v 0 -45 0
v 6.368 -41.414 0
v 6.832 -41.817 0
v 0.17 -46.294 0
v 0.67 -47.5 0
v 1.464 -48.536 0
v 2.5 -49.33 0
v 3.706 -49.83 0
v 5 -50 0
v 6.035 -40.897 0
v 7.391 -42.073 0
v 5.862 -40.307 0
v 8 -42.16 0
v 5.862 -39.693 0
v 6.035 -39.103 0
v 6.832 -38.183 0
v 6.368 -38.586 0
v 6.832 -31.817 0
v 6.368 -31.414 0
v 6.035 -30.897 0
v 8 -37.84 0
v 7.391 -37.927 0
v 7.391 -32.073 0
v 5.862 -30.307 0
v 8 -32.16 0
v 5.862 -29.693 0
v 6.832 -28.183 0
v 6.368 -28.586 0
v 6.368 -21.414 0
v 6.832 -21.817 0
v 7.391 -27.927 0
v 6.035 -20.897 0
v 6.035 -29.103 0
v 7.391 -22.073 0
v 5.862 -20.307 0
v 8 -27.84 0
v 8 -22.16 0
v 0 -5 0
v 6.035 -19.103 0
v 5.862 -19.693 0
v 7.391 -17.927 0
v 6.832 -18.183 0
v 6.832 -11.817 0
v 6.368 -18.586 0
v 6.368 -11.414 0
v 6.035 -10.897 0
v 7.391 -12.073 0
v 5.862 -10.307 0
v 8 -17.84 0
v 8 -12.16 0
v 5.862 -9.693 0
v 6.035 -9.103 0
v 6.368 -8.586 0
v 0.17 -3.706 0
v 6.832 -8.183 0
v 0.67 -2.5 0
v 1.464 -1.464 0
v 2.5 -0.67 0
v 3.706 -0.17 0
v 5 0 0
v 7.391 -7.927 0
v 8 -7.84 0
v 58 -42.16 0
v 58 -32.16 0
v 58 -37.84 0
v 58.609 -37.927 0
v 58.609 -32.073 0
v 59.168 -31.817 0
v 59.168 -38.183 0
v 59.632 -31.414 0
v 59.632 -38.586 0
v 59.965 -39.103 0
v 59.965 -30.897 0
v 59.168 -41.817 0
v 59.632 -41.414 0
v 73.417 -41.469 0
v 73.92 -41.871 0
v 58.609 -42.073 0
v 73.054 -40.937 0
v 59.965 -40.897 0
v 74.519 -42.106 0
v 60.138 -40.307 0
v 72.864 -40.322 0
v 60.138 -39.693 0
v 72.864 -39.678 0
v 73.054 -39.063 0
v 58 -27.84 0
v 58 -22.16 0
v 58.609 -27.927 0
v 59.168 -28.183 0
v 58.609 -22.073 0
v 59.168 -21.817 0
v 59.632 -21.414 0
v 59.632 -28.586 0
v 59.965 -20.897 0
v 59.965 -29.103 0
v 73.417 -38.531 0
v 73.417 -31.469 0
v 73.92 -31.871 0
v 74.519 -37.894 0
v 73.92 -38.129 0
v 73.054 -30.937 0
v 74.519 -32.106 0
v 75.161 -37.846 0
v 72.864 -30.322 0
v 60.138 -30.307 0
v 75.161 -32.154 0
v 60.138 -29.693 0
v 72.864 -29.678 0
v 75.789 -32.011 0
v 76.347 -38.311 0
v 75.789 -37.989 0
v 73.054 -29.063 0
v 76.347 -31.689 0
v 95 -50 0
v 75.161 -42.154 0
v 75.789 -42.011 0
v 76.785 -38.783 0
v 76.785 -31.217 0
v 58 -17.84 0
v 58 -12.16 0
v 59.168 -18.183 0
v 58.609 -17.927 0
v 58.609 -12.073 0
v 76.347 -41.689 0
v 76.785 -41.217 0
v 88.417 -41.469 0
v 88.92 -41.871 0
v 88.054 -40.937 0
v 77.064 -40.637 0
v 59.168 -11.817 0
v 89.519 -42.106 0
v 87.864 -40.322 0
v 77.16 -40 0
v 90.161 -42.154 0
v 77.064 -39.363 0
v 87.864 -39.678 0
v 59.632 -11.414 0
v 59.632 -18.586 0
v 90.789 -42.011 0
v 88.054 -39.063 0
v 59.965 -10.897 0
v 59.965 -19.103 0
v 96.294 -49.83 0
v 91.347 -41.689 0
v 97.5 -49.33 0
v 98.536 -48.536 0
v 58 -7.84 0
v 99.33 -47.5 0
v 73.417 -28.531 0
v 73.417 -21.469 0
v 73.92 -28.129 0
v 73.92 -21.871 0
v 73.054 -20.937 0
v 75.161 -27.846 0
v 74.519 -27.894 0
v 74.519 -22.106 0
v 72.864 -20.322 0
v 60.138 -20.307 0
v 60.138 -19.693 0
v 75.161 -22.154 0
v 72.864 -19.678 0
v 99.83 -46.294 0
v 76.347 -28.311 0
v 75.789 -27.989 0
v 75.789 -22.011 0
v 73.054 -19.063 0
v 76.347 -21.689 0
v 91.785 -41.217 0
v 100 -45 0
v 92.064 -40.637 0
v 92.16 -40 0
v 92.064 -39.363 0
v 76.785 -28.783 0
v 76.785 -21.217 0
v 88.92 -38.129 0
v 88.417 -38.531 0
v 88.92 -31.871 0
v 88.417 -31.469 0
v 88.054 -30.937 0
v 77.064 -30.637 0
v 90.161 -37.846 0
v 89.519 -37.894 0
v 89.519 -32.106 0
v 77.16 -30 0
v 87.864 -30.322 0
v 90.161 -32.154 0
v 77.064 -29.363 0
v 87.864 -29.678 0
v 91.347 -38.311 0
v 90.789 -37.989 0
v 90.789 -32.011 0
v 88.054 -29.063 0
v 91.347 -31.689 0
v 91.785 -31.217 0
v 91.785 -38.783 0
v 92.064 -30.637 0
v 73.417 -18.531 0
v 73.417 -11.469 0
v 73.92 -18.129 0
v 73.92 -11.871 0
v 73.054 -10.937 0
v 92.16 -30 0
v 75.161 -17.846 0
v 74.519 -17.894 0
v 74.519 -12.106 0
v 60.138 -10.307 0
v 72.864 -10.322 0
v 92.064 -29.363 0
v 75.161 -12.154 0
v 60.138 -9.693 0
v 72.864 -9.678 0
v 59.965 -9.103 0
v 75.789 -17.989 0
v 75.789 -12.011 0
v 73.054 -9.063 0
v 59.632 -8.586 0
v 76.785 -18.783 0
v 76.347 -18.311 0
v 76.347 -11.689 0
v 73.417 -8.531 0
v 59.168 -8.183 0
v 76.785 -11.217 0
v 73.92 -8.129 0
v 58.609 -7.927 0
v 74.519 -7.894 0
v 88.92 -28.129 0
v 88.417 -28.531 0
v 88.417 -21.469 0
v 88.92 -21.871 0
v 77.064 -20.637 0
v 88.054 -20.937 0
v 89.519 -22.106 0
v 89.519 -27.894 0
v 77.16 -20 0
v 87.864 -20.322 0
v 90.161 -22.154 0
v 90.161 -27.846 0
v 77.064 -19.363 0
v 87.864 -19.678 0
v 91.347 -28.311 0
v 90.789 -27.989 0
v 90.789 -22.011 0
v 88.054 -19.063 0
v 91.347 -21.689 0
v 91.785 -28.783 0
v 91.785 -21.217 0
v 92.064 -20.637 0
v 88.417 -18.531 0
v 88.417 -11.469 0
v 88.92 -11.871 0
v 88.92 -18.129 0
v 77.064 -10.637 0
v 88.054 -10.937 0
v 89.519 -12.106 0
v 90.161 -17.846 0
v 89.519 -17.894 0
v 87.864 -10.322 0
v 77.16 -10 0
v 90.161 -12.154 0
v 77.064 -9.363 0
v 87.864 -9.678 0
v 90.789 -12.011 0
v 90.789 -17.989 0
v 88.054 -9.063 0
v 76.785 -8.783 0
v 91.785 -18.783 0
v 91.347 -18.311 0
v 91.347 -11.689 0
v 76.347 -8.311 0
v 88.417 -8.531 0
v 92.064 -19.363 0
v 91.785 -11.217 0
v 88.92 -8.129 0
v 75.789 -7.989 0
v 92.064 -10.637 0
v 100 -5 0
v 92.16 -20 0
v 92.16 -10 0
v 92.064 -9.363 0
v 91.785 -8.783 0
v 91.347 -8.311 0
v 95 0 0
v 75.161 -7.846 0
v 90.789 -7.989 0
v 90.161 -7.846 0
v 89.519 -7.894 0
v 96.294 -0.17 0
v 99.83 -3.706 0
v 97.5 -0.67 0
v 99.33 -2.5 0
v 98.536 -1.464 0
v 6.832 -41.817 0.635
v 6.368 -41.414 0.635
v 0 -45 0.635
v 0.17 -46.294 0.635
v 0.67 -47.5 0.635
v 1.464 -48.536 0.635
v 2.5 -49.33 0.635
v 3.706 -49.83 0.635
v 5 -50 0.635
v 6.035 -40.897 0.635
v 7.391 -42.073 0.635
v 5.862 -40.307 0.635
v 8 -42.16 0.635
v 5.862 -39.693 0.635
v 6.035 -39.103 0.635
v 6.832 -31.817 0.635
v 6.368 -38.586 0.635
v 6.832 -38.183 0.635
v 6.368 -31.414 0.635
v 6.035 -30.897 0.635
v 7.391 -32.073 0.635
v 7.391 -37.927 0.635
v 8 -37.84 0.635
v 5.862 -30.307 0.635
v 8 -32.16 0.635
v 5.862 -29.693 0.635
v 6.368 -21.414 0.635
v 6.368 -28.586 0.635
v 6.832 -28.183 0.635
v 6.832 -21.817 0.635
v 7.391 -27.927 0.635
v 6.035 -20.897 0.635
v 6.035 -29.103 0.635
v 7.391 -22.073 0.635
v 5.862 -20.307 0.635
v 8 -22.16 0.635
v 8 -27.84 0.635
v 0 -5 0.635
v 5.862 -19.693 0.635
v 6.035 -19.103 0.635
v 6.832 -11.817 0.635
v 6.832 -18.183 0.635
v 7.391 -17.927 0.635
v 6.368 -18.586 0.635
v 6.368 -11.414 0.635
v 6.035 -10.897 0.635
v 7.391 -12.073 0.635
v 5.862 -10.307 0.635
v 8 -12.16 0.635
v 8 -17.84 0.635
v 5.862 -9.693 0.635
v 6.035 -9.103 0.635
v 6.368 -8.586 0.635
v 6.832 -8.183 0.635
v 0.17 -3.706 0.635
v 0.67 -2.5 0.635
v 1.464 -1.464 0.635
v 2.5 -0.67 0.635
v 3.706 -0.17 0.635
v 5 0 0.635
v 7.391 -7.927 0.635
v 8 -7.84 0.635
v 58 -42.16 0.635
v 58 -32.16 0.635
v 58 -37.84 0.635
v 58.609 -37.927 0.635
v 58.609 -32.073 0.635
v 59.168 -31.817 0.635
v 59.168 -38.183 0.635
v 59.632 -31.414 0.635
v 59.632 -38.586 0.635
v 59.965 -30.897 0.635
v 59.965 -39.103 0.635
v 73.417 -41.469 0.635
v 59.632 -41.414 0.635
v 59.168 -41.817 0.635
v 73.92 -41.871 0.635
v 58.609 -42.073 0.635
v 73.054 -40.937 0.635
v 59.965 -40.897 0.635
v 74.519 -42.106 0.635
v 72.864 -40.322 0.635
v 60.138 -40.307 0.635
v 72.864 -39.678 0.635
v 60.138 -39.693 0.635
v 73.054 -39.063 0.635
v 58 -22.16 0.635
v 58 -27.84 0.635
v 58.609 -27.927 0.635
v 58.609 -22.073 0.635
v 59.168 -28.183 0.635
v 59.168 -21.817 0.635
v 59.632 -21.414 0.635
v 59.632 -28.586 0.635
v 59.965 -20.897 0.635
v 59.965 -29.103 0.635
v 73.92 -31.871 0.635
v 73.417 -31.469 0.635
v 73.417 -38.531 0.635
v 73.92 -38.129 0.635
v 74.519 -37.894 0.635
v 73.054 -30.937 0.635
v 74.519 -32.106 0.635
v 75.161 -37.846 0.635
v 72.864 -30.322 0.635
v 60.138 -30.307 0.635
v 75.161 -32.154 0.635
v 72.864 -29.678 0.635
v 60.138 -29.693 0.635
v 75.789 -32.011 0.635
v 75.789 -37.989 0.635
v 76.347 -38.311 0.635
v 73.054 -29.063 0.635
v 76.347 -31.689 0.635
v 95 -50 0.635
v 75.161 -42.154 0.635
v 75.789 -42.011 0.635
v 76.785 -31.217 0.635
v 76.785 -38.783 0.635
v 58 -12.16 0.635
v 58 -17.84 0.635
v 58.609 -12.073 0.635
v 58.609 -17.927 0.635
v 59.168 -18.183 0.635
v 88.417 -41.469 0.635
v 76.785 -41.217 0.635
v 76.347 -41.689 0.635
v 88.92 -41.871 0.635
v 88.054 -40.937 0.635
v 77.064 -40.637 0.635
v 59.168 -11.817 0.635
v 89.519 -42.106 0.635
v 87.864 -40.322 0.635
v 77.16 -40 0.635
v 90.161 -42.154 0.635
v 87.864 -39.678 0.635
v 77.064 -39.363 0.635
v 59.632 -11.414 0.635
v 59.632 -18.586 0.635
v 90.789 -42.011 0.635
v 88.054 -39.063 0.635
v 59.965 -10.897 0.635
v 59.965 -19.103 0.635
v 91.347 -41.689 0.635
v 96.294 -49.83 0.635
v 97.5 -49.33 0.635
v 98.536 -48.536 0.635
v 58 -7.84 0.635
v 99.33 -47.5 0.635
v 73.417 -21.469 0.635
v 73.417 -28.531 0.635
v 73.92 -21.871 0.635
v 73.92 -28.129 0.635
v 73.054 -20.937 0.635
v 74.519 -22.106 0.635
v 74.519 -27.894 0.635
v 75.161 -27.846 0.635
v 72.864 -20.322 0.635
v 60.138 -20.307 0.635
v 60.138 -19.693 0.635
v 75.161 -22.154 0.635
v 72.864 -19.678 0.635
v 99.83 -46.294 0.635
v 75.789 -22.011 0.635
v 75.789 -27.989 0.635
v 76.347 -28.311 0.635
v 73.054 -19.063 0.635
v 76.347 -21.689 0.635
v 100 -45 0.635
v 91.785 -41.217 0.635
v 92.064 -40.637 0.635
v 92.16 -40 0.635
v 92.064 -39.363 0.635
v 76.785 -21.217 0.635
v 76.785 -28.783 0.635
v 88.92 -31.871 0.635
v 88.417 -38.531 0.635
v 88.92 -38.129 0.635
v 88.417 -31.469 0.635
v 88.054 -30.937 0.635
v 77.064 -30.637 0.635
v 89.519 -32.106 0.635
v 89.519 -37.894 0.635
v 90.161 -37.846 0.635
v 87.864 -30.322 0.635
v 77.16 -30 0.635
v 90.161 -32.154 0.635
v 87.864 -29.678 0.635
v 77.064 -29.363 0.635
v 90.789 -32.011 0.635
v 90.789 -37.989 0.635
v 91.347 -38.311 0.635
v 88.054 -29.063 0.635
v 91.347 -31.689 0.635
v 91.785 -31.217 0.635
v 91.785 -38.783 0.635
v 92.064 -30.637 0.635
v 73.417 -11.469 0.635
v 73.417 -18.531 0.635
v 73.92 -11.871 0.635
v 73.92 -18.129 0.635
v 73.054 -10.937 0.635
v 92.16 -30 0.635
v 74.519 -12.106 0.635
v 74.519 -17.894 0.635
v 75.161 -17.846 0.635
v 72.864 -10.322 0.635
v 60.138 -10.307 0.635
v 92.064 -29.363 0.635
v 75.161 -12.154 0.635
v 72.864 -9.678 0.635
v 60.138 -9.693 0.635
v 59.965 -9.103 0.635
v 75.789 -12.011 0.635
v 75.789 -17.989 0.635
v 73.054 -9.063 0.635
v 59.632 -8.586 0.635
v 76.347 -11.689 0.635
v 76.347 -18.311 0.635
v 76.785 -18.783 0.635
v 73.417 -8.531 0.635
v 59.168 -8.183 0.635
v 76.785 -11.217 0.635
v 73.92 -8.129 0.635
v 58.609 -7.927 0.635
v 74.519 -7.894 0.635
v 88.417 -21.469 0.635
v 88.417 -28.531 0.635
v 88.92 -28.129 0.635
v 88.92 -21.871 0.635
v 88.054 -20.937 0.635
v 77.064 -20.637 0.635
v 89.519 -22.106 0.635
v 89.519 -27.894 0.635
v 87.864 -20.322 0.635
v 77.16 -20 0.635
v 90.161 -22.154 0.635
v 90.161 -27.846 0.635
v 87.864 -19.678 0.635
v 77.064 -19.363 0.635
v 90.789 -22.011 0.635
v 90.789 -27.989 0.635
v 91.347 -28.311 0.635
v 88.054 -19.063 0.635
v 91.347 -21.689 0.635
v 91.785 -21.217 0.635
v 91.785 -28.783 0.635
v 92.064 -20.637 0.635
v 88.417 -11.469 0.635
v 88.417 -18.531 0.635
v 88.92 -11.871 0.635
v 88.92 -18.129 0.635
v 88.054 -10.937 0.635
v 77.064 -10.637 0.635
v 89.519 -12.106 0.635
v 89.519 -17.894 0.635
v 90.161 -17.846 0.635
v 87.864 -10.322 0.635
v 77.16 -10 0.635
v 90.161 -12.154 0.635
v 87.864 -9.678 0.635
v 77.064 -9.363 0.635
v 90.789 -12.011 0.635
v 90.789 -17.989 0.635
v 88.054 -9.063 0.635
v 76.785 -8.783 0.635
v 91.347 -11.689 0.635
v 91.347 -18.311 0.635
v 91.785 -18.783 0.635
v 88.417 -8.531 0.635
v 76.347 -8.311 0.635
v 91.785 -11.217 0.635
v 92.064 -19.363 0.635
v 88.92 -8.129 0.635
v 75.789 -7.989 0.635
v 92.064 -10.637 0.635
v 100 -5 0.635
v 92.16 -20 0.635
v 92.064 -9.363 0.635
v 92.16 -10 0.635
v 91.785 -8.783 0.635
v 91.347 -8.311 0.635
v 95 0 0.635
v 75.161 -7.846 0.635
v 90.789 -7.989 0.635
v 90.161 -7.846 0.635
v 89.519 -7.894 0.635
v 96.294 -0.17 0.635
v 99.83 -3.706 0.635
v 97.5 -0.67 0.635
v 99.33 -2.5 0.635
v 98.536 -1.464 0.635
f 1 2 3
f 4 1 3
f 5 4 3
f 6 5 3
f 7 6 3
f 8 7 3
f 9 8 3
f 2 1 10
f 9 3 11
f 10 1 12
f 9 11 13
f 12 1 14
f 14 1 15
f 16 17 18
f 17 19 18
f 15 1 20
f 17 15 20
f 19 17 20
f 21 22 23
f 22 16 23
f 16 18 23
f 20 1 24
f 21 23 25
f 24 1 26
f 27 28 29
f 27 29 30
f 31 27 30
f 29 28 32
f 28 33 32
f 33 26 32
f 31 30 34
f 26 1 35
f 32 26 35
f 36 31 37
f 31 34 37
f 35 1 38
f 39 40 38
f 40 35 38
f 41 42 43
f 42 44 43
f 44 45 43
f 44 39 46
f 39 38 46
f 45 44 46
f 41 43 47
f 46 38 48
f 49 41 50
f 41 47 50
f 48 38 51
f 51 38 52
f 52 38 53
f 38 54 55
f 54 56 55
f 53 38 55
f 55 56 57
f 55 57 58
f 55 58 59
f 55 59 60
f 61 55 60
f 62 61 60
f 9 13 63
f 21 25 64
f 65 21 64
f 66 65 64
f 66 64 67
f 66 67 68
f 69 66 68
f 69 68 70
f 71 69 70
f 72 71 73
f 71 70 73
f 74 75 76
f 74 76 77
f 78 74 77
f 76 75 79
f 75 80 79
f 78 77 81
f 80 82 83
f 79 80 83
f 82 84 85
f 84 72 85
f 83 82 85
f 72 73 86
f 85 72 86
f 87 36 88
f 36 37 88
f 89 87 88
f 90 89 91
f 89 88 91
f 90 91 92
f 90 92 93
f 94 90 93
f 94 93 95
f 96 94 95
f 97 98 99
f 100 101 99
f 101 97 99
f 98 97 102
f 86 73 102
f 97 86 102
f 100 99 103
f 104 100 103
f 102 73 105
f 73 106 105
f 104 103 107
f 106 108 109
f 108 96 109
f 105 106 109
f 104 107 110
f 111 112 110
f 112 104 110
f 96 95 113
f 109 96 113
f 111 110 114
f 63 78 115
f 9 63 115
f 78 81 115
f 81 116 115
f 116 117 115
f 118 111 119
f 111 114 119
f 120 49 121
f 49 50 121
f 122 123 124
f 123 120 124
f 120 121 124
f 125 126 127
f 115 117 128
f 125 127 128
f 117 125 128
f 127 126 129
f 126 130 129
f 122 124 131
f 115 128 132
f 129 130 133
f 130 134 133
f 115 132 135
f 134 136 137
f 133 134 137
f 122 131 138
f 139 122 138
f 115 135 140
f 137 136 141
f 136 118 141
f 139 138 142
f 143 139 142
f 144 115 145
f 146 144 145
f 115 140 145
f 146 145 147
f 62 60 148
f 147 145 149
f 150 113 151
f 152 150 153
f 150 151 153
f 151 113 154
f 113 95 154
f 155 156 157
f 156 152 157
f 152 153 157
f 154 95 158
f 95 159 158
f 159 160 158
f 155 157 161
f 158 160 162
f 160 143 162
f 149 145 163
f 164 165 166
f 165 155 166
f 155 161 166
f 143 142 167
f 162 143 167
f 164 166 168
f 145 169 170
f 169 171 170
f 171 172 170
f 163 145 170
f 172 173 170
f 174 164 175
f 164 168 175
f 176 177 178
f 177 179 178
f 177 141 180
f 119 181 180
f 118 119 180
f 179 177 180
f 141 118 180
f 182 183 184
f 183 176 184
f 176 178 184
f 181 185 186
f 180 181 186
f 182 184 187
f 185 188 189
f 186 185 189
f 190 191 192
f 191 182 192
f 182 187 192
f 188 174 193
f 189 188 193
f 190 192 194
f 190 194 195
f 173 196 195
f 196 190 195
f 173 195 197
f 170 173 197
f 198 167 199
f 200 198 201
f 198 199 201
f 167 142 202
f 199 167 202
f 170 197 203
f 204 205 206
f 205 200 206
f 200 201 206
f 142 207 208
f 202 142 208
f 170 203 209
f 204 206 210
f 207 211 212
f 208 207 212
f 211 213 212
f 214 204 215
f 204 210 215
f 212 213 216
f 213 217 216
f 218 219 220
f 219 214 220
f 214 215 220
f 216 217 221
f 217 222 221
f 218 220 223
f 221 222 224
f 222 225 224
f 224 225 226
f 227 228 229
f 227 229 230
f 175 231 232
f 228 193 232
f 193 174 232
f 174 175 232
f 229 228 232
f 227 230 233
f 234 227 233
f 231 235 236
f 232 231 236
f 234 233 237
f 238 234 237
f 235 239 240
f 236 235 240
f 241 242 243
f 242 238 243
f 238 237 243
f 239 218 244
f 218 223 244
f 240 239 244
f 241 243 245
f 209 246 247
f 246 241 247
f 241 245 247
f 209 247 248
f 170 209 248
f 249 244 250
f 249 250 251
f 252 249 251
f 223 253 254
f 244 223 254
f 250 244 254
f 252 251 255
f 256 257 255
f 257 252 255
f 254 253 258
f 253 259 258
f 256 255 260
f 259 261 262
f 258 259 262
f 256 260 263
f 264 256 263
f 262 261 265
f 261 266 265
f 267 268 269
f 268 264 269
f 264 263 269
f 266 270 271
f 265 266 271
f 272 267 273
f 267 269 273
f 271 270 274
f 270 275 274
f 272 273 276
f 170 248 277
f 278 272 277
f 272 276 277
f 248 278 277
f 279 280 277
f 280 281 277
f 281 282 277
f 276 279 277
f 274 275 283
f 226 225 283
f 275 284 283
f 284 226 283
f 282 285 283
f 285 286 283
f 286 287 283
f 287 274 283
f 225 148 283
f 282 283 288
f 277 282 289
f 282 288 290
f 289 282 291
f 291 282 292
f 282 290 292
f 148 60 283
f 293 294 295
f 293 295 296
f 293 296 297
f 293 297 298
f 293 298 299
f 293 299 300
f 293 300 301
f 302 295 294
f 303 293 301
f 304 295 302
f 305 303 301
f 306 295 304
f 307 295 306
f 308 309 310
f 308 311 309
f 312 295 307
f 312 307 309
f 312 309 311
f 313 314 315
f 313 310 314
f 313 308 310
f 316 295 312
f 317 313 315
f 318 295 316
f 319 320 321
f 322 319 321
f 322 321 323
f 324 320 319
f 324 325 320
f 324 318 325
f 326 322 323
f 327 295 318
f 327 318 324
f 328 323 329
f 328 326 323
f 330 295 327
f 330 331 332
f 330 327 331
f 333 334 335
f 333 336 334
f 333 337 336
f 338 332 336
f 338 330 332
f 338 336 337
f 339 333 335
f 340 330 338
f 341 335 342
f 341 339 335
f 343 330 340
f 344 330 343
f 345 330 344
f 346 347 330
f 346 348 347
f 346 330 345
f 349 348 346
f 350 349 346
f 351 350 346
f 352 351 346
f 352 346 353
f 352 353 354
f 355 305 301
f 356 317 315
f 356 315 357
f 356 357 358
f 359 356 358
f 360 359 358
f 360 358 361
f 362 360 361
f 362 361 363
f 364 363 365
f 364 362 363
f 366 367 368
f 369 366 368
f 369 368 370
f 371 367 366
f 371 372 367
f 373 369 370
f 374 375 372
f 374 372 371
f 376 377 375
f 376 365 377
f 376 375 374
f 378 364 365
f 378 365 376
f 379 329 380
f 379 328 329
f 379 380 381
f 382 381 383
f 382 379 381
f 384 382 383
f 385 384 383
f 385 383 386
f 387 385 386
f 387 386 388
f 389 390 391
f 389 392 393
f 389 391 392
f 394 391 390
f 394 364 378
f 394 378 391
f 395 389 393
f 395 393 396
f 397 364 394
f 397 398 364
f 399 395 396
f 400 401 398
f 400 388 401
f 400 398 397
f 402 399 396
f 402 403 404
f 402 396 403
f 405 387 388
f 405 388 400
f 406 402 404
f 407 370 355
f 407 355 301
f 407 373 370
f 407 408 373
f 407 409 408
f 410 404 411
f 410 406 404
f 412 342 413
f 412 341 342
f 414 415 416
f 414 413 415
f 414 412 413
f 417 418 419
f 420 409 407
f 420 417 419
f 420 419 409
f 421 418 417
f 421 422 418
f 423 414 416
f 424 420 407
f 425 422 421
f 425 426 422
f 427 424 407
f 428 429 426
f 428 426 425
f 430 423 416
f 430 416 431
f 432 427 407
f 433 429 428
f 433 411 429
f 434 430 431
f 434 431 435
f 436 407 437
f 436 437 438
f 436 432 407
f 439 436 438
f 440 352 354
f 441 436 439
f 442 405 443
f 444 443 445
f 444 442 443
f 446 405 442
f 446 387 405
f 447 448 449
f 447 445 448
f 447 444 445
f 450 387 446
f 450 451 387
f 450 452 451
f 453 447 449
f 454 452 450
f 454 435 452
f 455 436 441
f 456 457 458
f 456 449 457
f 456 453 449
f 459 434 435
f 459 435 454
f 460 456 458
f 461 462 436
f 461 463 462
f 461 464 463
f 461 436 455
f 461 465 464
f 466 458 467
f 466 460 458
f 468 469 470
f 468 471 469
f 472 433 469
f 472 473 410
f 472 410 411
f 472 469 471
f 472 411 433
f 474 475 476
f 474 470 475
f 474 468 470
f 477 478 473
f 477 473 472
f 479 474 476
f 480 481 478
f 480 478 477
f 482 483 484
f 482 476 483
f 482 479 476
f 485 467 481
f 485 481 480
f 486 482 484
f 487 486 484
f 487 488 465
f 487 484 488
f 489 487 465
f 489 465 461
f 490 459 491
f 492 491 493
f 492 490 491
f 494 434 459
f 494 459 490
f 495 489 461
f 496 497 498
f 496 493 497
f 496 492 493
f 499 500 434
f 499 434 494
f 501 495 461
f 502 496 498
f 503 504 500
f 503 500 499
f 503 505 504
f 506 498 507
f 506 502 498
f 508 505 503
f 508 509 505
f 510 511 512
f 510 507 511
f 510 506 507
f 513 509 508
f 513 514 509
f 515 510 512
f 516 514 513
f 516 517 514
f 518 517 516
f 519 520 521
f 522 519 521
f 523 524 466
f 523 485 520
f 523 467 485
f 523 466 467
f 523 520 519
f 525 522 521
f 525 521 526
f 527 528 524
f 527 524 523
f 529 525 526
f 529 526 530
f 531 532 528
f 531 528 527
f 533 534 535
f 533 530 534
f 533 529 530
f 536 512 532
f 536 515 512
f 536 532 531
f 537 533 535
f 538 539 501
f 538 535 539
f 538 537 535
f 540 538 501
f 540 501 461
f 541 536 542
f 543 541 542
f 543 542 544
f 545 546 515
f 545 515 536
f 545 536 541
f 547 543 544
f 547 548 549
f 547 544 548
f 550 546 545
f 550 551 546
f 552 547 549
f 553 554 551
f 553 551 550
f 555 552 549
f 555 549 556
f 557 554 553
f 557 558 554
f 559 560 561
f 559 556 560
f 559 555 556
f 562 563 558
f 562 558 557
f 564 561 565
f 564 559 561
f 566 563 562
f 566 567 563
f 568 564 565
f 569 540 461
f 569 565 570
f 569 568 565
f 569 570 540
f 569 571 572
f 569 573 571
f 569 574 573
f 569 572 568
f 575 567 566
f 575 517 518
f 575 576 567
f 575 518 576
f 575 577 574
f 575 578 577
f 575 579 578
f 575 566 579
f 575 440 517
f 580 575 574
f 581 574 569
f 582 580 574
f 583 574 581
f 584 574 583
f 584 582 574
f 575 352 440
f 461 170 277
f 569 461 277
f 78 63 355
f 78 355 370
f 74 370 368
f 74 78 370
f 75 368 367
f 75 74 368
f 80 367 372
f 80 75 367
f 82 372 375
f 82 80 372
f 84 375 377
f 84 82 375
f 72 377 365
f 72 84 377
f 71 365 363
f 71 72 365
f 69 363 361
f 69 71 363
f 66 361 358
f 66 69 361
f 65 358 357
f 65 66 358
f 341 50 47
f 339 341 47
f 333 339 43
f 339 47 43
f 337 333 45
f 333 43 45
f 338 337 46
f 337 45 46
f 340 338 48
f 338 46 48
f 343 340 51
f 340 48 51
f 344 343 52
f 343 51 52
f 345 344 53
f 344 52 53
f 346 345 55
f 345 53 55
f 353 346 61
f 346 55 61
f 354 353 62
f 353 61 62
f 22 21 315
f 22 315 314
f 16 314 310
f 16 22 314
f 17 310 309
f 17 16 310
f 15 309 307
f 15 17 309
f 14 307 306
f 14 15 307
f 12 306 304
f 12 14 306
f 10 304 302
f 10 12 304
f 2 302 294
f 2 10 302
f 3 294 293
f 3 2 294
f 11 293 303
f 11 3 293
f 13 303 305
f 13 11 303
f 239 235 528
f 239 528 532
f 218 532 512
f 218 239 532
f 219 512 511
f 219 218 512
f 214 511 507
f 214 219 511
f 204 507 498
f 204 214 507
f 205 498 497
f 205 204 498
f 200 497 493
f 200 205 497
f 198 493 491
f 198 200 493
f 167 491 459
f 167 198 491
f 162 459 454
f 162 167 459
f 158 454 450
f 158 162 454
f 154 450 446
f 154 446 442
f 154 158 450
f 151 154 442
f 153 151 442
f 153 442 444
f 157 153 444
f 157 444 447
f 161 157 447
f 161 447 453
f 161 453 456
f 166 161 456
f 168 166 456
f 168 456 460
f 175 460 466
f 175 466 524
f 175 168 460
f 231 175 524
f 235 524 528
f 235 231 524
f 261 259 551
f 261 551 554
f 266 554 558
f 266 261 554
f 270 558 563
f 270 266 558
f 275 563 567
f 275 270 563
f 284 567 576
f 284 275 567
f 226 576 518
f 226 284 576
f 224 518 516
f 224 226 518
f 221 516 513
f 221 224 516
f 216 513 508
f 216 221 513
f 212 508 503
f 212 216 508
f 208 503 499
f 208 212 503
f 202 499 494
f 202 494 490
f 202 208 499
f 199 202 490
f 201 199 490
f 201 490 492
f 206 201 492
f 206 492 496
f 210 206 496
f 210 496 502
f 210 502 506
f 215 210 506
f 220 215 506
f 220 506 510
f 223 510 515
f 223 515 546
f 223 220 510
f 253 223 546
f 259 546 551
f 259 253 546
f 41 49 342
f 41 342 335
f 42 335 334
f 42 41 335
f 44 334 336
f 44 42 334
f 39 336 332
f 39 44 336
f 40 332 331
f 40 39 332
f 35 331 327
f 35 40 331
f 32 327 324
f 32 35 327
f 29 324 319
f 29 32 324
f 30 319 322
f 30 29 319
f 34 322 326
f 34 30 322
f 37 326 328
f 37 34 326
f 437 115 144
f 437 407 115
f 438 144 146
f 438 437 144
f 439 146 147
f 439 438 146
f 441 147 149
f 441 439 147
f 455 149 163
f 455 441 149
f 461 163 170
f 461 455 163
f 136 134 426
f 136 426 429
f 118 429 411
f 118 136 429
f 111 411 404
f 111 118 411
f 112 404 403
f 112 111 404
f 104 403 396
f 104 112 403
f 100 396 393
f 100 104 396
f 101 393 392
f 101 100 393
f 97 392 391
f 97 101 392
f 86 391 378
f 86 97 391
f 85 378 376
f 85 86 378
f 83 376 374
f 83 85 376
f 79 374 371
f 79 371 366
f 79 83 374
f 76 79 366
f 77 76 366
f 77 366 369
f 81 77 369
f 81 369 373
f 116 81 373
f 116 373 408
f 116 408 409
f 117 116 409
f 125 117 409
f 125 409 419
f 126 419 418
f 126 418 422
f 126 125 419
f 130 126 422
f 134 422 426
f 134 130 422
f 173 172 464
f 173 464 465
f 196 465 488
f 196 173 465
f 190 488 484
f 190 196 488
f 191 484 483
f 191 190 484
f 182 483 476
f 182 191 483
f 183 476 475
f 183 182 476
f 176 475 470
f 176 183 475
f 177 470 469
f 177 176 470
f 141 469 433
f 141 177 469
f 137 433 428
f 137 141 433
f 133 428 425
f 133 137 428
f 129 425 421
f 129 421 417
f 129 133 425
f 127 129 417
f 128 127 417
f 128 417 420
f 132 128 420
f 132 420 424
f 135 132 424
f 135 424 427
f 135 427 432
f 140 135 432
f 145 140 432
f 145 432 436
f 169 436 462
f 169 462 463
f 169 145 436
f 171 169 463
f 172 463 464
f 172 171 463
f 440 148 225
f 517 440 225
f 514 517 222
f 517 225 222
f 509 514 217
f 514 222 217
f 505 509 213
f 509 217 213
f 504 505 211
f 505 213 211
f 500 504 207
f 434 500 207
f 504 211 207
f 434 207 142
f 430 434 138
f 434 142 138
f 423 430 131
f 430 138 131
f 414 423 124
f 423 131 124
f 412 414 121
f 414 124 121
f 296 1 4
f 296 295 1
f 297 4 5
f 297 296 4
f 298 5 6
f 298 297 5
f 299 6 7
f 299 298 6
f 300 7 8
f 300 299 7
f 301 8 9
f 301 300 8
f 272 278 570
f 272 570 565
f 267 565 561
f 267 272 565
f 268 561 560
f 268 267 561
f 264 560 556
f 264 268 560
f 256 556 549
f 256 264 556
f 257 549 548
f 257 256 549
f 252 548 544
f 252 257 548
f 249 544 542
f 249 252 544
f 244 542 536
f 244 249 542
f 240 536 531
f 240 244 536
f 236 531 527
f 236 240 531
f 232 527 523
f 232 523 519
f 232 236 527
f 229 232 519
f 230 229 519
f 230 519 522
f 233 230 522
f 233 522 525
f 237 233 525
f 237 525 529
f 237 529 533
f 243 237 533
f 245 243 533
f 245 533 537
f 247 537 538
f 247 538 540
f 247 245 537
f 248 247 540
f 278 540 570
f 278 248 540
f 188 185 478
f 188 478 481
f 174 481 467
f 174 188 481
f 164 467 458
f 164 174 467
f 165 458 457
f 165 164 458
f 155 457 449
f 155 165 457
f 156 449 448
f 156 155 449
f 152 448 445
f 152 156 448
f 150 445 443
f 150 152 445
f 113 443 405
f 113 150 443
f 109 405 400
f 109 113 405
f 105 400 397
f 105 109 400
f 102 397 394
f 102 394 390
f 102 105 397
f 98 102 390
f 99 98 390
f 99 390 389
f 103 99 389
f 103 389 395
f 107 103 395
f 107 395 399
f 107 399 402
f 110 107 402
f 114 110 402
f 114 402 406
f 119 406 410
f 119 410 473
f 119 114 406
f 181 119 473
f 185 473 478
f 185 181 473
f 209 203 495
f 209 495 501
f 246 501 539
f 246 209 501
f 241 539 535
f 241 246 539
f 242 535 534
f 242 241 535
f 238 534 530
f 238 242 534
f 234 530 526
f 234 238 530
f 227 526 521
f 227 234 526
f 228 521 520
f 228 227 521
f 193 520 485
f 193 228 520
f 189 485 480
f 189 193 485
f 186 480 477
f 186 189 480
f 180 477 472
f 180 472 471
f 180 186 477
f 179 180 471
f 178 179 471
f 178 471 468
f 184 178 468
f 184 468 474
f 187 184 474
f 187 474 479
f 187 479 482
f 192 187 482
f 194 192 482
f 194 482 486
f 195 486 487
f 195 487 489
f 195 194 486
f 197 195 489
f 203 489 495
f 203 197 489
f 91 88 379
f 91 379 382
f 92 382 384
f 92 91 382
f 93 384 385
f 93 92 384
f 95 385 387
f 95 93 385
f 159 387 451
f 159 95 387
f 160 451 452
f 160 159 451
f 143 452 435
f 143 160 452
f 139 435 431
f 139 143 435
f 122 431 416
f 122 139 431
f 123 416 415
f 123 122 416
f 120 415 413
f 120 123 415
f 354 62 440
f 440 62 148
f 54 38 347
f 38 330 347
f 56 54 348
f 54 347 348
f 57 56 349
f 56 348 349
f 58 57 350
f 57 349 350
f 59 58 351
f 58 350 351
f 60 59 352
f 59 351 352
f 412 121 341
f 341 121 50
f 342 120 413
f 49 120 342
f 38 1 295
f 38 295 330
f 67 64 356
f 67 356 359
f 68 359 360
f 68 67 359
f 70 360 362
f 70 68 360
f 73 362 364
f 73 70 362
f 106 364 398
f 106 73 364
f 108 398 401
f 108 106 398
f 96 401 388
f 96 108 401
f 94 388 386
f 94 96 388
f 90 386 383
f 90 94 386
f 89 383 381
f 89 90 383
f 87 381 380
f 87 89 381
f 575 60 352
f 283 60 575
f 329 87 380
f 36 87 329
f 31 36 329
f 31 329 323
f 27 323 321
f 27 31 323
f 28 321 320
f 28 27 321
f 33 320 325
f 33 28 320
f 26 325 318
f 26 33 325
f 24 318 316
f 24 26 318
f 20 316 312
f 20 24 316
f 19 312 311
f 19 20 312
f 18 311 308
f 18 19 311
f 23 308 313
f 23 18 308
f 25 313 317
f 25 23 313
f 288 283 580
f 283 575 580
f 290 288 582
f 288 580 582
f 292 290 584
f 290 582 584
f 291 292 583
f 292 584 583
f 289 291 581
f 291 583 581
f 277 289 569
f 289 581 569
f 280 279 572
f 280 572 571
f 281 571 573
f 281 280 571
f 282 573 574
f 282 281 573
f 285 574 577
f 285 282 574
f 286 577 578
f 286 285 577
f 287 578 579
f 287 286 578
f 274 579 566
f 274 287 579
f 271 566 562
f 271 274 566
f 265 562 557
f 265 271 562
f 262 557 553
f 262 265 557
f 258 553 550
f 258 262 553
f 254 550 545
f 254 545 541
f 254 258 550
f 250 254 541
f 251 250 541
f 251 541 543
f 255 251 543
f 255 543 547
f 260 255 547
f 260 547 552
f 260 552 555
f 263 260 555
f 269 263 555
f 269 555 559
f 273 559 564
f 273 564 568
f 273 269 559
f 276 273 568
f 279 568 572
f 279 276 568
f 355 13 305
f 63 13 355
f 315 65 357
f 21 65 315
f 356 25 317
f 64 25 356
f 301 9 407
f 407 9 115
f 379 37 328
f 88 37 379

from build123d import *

# Parameters (mm, degrees)
SKETCH1_W           = 100
SKETCH1_H           = 50
SKETCH1_R           = 2.16
BOSS_EXTRUDE1_DEPTH = 0.635
FILLET1_R           = 5


with BuildPart() as part:
    # Sketch1 → Boss-Extrude1 (new body)
    with BuildSketch(Plane.XY):
        with Locations((50, -25)):
            Rectangle(SKETCH1_W, SKETCH1_H)
        with Locations((75, -10)):
            Circle(SKETCH1_R, mode=Mode.SUBTRACT)
        with Locations((90, -10)):
            Circle(SKETCH1_R, mode=Mode.SUBTRACT)
        with Locations((75, -20)):
            Circle(SKETCH1_R, mode=Mode.SUBTRACT)
        with Locations((90, -20)):
            Circle(SKETCH1_R, mode=Mode.SUBTRACT)
        with Locations((75, -30)):
            Circle(SKETCH1_R, mode=Mode.SUBTRACT)
        with Locations((90, -30)):
            Circle(SKETCH1_R, mode=Mode.SUBTRACT)
        with Locations((75, -40)):
            Circle(SKETCH1_R, mode=Mode.SUBTRACT)
        with Locations((90, -40)):
            Circle(SKETCH1_R, mode=Mode.SUBTRACT)
        with BuildLine():
            Line((8, -7.84), (58, -7.84))
            ThreePointArc((58, -7.84), (60.16, -10), (58, -12.16))
            Line((58, -12.16), (8, -12.16))
            ThreePointArc((8, -12.16), (5.84, -10), (8, -7.84))
        make_face(mode=Mode.SUBTRACT)
        with BuildLine():
            Line((8, -22.16), (58, -22.16))
            ThreePointArc((58, -22.16), (60.16, -20), (58, -17.84))
            Line((58, -17.84), (8, -17.84))
            ThreePointArc((8, -17.84), (5.84, -20), (8, -22.16))
        make_face(mode=Mode.SUBTRACT)
        with BuildLine():
            Line((8, -32.16), (58, -32.16))
            ThreePointArc((58, -32.16), (60.16, -30), (58, -27.84))
            Line((58, -27.84), (8, -27.84))
            ThreePointArc((8, -27.84), (5.84, -30), (8, -32.16))
        make_face(mode=Mode.SUBTRACT)
        with BuildLine():
            Line((8, -42.16), (58, -42.16))
            ThreePointArc((58, -42.16), (60.16, -40), (58, -37.84))
            Line((58, -37.84), (8, -37.84))
            ThreePointArc((8, -37.84), (5.84, -40), (8, -42.16))
        make_face(mode=Mode.SUBTRACT)
    extrude(amount=BOSS_EXTRUDE1_DEPTH)

    # Fillet1
    fillet1_edges = [part.edges().sort_by_distance(p)[0] for p in [
        (100, 0, 0.3175),
        (100, -50, 0.3175),
        (0, -50, 0.3175),
        (0, 0, 0.3175),
    ]]
    fillet(fillet1_edges, radius=FILLET1_R)


solid = part.part
